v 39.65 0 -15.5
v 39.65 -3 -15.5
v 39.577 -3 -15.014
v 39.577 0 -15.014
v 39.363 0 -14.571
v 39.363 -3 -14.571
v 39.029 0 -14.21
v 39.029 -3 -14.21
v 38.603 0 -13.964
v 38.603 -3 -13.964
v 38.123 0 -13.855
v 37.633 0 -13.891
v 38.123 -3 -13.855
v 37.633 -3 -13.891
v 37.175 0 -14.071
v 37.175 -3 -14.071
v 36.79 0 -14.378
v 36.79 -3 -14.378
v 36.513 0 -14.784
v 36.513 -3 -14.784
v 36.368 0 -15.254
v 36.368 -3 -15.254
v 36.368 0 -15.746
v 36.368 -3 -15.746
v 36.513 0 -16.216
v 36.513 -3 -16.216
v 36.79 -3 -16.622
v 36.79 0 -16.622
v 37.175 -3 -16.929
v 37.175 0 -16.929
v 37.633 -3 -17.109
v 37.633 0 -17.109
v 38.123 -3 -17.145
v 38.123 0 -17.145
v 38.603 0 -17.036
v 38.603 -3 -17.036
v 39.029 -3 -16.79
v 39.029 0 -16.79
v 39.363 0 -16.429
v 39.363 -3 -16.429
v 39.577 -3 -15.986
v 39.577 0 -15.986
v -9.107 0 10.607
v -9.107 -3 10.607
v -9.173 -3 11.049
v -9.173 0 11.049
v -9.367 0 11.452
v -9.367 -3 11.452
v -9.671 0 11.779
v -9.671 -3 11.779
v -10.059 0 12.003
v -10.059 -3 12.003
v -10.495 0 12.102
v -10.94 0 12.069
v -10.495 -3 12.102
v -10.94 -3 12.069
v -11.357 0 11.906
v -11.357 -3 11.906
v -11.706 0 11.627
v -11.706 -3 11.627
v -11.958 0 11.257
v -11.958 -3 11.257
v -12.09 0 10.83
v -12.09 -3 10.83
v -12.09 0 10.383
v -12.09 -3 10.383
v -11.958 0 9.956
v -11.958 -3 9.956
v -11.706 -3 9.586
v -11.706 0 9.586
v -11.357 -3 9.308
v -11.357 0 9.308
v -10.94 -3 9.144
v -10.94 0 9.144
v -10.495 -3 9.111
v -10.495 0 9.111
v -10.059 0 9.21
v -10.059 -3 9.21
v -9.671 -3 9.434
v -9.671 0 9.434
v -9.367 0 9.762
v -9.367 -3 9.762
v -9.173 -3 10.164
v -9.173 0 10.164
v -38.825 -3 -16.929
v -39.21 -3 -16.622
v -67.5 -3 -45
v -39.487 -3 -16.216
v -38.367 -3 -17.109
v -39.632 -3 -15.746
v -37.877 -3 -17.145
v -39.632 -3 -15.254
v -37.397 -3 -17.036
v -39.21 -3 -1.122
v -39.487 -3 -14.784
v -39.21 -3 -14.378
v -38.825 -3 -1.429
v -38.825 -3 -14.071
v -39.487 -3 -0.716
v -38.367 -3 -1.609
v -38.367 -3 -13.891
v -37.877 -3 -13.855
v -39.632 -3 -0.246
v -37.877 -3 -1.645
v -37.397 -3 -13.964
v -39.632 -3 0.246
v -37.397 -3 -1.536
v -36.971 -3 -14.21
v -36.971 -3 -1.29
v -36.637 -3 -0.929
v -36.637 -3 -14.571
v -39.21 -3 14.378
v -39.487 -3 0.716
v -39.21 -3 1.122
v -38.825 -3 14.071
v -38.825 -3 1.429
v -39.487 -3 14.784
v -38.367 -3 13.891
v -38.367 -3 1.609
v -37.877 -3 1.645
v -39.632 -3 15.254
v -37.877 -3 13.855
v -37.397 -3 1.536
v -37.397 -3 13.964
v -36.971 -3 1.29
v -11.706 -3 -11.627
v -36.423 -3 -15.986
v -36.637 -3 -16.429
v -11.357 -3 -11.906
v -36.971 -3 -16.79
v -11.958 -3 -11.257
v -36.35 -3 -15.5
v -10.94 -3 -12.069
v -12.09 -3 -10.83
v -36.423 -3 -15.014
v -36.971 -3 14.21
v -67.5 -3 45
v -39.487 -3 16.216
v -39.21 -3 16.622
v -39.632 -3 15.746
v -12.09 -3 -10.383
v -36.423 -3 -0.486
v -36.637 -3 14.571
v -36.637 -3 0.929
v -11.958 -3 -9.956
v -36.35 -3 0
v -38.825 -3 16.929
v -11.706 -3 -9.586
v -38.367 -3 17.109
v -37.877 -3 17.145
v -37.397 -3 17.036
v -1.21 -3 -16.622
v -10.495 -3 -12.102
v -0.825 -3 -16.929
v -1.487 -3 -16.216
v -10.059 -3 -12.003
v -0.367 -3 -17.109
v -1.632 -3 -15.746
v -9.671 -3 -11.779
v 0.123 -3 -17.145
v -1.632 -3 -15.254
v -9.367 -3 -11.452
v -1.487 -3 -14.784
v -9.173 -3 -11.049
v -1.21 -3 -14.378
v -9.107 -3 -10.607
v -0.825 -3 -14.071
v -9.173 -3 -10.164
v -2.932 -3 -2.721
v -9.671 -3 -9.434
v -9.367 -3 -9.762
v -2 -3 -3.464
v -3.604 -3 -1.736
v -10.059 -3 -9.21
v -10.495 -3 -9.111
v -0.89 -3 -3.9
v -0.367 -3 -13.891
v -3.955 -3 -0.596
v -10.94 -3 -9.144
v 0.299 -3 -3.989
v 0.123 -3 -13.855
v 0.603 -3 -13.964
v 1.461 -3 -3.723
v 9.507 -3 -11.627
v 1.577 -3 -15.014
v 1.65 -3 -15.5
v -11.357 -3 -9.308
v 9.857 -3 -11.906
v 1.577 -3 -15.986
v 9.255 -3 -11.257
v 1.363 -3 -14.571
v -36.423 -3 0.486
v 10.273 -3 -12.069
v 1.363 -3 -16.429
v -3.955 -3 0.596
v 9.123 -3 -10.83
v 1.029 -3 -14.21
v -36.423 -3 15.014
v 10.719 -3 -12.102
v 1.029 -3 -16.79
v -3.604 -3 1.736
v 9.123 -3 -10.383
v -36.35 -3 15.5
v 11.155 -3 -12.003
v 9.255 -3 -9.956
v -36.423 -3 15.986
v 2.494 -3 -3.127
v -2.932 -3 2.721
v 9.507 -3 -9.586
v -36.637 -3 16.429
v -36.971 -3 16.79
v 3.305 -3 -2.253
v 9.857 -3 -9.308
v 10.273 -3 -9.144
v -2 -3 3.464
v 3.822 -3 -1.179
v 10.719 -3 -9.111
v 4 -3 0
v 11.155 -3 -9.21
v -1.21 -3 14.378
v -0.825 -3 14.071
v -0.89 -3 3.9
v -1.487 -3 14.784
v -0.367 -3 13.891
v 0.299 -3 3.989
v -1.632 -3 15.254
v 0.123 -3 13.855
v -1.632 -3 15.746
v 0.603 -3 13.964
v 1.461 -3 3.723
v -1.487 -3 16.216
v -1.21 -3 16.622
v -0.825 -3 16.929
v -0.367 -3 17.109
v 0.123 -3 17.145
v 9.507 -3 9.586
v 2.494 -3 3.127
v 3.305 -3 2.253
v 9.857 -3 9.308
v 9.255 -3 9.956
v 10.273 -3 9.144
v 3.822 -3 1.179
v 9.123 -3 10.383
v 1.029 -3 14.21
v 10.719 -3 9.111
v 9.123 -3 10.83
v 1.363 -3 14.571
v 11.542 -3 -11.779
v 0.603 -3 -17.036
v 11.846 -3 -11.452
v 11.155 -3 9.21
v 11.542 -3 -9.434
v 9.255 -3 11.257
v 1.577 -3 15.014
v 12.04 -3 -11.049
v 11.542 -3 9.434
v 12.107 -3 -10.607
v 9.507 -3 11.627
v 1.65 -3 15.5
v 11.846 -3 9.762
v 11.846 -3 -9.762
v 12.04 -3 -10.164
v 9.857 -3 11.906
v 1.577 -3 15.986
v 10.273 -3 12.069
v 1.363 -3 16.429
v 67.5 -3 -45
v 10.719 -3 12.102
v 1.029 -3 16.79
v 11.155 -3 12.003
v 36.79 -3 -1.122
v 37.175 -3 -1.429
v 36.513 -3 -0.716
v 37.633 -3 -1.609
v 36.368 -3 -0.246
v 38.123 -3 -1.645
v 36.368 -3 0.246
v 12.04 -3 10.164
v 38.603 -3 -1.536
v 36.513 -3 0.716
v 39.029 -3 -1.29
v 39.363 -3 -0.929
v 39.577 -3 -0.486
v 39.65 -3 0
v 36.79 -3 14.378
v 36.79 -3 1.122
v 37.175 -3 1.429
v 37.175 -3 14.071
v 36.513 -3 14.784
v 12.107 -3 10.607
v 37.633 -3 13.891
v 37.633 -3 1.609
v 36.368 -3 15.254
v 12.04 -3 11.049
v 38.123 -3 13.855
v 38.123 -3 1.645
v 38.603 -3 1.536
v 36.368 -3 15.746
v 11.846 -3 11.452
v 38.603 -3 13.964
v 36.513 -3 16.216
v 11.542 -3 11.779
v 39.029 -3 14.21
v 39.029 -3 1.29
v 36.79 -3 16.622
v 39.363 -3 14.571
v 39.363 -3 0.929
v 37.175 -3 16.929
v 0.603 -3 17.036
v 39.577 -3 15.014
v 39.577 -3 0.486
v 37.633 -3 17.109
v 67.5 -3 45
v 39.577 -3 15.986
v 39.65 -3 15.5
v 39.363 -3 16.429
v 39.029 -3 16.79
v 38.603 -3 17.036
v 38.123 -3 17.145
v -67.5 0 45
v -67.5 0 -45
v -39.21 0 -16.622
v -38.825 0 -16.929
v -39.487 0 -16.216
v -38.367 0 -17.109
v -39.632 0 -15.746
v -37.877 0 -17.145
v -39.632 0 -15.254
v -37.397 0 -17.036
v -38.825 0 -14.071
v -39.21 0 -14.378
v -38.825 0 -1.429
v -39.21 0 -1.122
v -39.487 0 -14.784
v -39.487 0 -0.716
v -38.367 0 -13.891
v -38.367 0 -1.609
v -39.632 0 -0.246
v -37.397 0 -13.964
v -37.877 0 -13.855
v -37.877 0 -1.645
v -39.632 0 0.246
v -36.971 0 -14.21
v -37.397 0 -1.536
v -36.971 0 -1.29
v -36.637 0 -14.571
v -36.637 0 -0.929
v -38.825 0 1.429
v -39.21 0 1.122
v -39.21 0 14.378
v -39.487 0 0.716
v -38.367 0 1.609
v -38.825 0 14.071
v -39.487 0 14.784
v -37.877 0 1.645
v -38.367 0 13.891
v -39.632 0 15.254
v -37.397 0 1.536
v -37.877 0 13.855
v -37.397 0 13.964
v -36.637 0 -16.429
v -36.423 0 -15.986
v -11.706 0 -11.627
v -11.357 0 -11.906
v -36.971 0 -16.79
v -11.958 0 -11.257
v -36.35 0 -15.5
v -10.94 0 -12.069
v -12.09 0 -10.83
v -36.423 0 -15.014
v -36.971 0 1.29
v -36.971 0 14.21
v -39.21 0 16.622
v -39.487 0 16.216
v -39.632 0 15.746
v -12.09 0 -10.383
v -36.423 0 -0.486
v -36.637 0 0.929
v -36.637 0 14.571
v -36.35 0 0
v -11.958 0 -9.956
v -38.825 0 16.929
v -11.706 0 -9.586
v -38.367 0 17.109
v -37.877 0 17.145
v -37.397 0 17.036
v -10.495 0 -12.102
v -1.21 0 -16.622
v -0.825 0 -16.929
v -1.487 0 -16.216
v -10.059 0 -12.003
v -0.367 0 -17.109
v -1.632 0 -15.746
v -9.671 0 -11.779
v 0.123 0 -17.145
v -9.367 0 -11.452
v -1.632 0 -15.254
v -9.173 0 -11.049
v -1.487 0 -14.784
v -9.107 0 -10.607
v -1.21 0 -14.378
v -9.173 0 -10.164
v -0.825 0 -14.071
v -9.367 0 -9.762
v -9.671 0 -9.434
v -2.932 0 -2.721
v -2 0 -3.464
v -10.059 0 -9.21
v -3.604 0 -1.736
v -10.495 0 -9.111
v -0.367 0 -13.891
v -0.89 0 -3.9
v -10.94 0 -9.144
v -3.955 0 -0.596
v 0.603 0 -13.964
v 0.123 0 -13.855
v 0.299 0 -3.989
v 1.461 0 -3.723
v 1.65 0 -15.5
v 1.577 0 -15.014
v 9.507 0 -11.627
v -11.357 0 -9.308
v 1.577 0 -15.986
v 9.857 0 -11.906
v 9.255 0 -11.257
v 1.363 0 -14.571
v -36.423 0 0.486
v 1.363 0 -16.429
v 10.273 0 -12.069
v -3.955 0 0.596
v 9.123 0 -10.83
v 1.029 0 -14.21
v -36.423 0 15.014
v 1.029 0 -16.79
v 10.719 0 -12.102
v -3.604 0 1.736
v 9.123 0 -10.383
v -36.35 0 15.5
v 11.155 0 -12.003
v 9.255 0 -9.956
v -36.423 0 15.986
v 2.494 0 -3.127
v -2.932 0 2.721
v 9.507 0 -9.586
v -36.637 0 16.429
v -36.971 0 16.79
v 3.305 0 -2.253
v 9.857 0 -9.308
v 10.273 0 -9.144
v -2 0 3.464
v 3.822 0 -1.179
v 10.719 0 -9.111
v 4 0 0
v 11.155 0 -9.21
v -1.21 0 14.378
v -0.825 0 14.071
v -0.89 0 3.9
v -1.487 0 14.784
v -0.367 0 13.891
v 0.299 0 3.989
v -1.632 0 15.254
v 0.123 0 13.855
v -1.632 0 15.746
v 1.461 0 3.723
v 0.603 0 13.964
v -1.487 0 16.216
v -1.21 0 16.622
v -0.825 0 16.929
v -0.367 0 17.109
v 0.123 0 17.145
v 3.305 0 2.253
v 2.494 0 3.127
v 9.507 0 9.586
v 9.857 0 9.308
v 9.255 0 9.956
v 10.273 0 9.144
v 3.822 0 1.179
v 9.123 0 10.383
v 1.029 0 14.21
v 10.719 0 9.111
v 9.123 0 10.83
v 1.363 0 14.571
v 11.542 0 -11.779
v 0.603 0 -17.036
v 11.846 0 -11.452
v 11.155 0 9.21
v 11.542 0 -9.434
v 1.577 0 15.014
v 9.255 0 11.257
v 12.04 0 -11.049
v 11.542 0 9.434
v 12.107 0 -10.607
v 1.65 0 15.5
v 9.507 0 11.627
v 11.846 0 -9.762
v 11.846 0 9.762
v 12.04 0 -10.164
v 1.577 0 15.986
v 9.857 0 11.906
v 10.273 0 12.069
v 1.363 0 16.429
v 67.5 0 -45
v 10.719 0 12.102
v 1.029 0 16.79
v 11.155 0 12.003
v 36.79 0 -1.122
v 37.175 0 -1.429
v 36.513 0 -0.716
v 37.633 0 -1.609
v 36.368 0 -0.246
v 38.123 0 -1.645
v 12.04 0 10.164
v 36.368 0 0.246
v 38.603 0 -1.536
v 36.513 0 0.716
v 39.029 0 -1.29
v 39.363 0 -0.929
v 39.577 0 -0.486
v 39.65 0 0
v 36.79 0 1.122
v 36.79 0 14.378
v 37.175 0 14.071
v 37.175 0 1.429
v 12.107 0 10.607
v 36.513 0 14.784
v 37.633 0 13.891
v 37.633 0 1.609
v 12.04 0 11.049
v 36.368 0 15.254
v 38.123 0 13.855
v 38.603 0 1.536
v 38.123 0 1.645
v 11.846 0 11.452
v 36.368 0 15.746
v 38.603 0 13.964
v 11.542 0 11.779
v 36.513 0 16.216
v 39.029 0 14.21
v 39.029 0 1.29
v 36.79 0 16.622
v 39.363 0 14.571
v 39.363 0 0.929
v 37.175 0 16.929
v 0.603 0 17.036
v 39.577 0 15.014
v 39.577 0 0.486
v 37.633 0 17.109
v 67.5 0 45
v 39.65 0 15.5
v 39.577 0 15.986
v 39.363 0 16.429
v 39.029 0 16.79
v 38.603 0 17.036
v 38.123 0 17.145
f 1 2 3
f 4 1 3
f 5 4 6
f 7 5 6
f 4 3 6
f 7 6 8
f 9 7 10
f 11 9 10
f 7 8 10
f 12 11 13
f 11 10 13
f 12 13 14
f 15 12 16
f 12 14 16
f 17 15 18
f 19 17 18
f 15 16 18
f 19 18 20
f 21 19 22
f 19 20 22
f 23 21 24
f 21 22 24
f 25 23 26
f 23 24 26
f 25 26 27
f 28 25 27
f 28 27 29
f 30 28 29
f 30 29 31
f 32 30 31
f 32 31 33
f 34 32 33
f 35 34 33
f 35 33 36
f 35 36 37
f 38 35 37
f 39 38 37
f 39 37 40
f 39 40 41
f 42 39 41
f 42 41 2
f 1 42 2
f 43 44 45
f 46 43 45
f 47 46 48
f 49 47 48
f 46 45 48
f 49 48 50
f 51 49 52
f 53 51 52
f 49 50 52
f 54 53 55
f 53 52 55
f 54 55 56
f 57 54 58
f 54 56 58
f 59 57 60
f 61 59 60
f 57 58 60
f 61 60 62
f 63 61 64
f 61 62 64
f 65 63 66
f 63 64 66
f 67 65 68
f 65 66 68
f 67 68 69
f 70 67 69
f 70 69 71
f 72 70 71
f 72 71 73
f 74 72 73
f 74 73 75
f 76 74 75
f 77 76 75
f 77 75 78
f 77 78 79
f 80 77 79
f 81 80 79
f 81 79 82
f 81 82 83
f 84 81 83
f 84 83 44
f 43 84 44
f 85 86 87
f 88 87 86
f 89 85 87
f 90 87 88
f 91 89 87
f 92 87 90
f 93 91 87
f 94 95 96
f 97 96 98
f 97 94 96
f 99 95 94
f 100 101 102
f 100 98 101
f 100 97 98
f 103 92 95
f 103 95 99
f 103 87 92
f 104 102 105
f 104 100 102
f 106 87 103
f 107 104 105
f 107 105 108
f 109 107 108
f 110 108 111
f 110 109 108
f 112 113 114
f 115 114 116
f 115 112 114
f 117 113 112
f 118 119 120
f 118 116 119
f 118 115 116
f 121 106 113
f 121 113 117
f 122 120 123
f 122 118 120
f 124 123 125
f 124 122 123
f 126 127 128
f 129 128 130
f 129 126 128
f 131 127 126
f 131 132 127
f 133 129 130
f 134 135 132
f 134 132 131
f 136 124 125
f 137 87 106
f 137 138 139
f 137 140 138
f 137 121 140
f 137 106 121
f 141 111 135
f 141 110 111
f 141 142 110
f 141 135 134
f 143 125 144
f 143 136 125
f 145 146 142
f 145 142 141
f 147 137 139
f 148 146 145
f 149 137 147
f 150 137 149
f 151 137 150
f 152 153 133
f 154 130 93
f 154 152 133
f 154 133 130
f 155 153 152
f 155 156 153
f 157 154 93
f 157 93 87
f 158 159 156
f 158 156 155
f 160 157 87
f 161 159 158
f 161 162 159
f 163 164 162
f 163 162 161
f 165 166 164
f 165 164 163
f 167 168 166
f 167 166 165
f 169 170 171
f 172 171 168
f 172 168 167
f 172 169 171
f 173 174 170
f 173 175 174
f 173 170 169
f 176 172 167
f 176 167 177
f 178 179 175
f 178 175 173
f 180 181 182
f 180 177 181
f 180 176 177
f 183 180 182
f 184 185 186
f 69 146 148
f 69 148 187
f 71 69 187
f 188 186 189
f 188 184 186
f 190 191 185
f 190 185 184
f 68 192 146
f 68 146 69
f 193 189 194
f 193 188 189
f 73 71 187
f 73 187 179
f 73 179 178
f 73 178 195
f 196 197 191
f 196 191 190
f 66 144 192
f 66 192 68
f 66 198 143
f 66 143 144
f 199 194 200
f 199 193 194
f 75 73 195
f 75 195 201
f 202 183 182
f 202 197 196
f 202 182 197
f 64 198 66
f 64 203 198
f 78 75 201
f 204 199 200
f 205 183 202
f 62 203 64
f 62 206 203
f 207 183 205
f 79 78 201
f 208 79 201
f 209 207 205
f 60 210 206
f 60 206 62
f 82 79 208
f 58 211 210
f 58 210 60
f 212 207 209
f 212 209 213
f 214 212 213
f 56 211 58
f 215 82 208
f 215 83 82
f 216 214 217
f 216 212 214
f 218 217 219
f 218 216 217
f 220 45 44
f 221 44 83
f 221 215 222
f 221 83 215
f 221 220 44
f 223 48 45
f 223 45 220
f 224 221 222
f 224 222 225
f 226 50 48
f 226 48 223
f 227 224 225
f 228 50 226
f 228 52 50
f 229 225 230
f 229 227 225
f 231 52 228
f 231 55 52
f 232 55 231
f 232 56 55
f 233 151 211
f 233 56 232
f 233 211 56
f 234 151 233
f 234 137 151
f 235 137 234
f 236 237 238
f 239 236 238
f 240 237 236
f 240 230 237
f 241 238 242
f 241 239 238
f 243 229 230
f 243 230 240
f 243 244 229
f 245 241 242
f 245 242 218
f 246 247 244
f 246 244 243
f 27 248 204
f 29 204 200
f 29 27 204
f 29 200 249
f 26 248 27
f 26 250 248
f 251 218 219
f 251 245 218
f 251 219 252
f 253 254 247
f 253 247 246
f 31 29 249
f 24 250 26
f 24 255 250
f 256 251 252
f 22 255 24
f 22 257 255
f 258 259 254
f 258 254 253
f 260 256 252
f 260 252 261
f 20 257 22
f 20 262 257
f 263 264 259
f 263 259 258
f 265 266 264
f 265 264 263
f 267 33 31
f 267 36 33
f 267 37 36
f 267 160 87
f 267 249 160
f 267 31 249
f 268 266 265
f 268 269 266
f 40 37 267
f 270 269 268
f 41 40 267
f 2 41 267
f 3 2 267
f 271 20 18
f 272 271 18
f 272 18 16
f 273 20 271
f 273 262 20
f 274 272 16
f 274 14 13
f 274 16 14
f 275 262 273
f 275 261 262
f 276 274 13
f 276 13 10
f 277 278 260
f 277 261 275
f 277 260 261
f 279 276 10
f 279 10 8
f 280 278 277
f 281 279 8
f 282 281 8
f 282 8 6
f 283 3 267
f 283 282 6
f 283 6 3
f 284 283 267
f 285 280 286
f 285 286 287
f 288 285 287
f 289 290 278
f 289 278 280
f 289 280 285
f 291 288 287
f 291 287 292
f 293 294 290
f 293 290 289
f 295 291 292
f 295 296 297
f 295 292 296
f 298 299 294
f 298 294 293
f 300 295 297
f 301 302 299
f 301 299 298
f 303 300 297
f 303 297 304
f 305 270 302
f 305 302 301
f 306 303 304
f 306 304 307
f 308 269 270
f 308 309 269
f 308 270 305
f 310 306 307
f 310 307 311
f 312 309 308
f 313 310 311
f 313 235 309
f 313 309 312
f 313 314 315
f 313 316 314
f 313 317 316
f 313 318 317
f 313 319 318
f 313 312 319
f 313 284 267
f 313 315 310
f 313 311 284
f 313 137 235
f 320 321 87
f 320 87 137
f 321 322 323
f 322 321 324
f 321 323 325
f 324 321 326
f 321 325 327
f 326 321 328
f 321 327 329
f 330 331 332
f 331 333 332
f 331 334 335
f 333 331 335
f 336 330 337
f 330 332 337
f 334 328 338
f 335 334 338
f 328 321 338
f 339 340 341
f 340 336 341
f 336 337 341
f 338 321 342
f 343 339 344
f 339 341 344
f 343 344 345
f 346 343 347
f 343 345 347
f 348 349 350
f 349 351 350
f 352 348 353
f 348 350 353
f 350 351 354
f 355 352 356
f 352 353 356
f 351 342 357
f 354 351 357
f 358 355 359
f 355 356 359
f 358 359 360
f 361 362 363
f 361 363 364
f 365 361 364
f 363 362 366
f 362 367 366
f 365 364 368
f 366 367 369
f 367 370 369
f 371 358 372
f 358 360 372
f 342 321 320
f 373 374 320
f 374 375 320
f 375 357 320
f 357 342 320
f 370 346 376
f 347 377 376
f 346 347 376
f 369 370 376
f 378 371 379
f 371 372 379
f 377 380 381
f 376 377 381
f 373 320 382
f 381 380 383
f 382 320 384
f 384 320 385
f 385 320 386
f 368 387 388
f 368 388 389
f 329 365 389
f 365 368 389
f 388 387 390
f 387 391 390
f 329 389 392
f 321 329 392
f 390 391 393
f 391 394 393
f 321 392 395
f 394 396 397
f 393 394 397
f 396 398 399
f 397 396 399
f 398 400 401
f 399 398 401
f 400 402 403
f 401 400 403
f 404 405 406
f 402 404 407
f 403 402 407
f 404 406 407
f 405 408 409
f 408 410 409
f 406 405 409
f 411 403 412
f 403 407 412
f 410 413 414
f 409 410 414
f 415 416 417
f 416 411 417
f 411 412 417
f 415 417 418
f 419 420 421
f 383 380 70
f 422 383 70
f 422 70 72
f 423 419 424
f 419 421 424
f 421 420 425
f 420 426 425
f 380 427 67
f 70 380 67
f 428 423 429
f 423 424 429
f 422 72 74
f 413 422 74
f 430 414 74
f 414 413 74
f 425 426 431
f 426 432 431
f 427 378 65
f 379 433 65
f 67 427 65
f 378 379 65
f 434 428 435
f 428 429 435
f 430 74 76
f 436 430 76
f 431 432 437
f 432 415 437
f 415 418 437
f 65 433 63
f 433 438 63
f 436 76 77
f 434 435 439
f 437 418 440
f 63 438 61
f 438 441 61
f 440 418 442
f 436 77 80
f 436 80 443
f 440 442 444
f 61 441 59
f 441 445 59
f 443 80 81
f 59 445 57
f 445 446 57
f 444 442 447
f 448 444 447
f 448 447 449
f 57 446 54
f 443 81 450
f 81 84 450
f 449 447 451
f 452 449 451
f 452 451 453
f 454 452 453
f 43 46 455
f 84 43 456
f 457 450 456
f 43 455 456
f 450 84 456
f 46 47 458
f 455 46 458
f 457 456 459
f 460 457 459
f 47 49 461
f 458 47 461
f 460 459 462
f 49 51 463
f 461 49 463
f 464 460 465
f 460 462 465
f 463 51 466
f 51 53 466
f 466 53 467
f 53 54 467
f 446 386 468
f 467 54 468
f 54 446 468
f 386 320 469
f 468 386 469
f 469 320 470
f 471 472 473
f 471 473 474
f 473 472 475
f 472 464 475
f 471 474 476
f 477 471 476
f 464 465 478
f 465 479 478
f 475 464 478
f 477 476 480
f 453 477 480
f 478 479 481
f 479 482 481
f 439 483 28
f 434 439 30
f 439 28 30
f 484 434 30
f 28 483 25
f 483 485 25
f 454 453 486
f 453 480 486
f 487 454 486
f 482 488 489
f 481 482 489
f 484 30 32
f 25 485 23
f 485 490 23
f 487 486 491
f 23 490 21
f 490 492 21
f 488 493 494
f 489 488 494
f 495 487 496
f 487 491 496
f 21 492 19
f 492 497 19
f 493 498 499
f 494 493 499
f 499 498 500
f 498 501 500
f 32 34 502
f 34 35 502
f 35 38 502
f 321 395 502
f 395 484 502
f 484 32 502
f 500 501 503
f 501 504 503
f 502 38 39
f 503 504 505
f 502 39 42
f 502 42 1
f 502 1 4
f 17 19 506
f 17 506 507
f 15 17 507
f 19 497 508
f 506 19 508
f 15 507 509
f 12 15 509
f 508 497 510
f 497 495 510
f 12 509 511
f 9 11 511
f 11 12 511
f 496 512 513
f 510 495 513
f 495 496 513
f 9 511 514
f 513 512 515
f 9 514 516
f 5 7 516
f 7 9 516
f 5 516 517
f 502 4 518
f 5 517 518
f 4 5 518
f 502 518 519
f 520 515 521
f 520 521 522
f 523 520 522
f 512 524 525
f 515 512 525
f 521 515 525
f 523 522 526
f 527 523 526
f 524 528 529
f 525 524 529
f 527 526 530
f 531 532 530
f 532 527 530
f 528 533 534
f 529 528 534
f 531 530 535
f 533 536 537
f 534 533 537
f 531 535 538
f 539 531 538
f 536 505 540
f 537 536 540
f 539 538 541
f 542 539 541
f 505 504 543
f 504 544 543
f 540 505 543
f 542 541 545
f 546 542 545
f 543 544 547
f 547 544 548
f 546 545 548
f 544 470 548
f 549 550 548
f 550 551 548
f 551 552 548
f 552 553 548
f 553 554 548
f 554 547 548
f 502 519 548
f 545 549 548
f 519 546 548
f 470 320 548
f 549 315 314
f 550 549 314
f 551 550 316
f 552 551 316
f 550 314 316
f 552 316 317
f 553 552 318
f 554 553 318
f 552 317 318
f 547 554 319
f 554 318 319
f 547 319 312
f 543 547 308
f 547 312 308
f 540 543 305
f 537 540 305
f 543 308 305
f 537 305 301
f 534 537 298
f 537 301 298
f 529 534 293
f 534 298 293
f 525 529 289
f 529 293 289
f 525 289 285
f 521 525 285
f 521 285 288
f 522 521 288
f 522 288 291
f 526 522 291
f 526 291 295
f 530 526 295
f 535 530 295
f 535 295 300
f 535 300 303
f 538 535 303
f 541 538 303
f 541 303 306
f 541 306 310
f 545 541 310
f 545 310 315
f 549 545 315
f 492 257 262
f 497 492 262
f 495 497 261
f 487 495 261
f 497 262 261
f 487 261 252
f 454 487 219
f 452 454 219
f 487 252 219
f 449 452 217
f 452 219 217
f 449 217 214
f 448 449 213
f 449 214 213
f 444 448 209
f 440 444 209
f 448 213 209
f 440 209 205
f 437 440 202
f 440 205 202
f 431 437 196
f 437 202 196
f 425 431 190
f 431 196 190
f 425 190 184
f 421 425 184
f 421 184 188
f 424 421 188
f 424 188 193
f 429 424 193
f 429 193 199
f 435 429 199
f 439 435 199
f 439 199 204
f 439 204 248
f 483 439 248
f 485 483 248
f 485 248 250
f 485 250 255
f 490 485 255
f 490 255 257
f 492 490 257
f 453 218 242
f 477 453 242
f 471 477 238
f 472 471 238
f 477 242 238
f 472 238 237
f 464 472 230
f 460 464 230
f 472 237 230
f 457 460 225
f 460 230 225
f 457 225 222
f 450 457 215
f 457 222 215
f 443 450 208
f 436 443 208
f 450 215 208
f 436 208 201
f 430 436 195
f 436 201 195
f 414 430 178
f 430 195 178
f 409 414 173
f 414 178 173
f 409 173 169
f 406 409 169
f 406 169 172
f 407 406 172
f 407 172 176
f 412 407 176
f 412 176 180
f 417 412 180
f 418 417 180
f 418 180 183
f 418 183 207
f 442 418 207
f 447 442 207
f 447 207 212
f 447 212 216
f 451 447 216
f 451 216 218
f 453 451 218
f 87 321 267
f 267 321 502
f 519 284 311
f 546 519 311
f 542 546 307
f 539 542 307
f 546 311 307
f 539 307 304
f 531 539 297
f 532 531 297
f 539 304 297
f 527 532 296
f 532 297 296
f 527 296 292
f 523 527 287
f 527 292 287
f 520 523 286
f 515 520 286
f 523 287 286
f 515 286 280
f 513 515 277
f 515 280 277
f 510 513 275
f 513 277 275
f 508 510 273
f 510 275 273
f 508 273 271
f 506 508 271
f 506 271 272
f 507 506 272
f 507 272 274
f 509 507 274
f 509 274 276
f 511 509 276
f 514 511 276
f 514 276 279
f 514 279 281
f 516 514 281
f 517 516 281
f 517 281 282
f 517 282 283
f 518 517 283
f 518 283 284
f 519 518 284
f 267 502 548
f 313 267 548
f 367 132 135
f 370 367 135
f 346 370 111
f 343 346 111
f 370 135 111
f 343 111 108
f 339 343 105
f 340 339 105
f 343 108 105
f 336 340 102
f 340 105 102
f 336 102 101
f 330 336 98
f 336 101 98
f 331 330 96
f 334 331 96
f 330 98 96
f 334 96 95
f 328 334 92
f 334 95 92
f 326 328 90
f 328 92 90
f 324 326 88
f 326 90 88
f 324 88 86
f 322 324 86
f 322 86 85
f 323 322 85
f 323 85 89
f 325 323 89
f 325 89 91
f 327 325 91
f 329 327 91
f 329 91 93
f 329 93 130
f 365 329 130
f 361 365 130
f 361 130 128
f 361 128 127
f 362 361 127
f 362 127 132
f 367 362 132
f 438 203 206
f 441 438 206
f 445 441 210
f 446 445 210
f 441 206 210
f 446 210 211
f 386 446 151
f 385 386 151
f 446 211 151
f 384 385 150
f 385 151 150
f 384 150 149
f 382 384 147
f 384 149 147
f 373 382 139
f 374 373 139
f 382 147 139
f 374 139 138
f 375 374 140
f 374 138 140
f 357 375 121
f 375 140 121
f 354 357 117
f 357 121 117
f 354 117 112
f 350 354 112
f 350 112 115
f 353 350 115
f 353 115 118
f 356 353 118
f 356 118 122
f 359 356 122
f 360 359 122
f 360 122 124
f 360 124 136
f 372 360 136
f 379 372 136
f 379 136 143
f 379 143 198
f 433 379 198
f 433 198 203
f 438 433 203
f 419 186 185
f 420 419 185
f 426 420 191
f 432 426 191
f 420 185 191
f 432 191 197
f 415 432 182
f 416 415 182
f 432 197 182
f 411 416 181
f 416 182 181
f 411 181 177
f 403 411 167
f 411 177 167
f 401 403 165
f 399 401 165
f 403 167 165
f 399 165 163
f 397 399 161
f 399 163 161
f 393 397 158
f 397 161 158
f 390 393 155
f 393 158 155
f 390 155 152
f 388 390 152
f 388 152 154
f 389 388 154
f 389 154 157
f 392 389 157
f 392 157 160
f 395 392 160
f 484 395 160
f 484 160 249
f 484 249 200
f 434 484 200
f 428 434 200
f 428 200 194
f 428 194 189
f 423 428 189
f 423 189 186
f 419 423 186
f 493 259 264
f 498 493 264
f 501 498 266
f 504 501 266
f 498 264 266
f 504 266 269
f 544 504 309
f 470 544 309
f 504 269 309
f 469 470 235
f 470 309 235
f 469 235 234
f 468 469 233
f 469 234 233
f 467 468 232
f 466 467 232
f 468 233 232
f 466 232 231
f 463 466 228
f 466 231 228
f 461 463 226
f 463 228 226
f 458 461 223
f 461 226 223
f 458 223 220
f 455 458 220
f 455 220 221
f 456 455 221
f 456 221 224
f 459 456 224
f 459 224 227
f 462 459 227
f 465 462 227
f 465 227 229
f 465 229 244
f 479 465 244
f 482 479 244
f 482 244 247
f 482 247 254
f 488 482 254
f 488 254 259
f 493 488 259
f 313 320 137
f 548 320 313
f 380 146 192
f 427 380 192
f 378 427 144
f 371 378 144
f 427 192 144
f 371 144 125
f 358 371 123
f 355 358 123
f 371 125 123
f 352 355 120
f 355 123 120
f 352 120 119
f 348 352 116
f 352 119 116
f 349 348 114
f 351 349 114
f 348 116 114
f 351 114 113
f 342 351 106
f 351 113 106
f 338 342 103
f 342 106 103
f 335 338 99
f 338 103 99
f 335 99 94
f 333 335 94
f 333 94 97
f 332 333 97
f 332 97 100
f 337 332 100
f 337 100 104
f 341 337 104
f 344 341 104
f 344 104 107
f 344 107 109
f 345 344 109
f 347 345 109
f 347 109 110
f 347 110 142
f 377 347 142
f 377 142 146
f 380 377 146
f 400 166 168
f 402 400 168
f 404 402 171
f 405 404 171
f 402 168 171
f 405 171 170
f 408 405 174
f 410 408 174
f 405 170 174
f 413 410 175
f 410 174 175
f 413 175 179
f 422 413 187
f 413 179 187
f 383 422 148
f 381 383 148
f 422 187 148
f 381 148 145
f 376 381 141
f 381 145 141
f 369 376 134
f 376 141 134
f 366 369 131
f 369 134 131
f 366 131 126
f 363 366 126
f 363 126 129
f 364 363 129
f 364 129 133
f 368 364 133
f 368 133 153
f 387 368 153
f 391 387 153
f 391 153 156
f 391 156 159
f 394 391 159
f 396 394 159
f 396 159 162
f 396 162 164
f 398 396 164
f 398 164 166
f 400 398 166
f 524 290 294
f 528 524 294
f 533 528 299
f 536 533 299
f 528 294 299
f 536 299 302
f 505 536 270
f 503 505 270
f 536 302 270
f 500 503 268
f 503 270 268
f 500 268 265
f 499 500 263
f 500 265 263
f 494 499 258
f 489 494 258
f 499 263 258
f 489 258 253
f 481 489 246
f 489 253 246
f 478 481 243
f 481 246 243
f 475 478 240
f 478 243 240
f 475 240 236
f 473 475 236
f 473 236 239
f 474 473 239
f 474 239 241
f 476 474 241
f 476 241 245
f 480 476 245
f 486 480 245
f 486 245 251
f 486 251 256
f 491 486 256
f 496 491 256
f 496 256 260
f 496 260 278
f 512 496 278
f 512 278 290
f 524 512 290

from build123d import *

# Parameters (mm, degrees)
F0_W     = 135
F0_H     = 90
F1_DEPTH = 3
F2_R     = 1.65
F2_R_2   = 1.5
F2_R_3   = 4
F3_DEPTH = 3.001


with BuildPart() as f1:
    # F0 (on Front) → F1 (new body)
    with BuildSketch(Plane.XZ):
        Rectangle(F0_W, F0_H)
    extrude(amount=F1_DEPTH)

    # F2 (on face) → F3 (cut, through all)
    with BuildSketch(Plane.XZ.offset(3)):
        with Locations((0, 15.5)):
            Circle(F2_R)
        with Locations((0, -15.5)):
            Circle(F2_R)
        with Locations((38, 0)):
            Circle(F2_R)
        with Locations((-38, 0)):
            Circle(F2_R)
        with Locations((-38, 15.5)):
            Circle(F2_R)
        with Locations((-38, -15.5)):
            Circle(F2_R)
        with Locations((38, 15.5)):
            Circle(F2_R)
        with Locations((38, -15.5)):
            Circle(F2_R)
        with Locations((10.606602, 10.606602)):
            Circle(F2_R_2)
        with Locations((-10.606602, -10.606602)):
            Circle(F2_R_2)
        with Locations((-10.606602, 10.606602)):
            Circle(F2_R_2)
        with Locations((10.606602, -10.606602)):
            Circle(F2_R_2)
        Circle(F2_R_3)
    extrude(amount=-F3_DEPTH, mode=Mode.SUBTRACT)


solid = f1.part
